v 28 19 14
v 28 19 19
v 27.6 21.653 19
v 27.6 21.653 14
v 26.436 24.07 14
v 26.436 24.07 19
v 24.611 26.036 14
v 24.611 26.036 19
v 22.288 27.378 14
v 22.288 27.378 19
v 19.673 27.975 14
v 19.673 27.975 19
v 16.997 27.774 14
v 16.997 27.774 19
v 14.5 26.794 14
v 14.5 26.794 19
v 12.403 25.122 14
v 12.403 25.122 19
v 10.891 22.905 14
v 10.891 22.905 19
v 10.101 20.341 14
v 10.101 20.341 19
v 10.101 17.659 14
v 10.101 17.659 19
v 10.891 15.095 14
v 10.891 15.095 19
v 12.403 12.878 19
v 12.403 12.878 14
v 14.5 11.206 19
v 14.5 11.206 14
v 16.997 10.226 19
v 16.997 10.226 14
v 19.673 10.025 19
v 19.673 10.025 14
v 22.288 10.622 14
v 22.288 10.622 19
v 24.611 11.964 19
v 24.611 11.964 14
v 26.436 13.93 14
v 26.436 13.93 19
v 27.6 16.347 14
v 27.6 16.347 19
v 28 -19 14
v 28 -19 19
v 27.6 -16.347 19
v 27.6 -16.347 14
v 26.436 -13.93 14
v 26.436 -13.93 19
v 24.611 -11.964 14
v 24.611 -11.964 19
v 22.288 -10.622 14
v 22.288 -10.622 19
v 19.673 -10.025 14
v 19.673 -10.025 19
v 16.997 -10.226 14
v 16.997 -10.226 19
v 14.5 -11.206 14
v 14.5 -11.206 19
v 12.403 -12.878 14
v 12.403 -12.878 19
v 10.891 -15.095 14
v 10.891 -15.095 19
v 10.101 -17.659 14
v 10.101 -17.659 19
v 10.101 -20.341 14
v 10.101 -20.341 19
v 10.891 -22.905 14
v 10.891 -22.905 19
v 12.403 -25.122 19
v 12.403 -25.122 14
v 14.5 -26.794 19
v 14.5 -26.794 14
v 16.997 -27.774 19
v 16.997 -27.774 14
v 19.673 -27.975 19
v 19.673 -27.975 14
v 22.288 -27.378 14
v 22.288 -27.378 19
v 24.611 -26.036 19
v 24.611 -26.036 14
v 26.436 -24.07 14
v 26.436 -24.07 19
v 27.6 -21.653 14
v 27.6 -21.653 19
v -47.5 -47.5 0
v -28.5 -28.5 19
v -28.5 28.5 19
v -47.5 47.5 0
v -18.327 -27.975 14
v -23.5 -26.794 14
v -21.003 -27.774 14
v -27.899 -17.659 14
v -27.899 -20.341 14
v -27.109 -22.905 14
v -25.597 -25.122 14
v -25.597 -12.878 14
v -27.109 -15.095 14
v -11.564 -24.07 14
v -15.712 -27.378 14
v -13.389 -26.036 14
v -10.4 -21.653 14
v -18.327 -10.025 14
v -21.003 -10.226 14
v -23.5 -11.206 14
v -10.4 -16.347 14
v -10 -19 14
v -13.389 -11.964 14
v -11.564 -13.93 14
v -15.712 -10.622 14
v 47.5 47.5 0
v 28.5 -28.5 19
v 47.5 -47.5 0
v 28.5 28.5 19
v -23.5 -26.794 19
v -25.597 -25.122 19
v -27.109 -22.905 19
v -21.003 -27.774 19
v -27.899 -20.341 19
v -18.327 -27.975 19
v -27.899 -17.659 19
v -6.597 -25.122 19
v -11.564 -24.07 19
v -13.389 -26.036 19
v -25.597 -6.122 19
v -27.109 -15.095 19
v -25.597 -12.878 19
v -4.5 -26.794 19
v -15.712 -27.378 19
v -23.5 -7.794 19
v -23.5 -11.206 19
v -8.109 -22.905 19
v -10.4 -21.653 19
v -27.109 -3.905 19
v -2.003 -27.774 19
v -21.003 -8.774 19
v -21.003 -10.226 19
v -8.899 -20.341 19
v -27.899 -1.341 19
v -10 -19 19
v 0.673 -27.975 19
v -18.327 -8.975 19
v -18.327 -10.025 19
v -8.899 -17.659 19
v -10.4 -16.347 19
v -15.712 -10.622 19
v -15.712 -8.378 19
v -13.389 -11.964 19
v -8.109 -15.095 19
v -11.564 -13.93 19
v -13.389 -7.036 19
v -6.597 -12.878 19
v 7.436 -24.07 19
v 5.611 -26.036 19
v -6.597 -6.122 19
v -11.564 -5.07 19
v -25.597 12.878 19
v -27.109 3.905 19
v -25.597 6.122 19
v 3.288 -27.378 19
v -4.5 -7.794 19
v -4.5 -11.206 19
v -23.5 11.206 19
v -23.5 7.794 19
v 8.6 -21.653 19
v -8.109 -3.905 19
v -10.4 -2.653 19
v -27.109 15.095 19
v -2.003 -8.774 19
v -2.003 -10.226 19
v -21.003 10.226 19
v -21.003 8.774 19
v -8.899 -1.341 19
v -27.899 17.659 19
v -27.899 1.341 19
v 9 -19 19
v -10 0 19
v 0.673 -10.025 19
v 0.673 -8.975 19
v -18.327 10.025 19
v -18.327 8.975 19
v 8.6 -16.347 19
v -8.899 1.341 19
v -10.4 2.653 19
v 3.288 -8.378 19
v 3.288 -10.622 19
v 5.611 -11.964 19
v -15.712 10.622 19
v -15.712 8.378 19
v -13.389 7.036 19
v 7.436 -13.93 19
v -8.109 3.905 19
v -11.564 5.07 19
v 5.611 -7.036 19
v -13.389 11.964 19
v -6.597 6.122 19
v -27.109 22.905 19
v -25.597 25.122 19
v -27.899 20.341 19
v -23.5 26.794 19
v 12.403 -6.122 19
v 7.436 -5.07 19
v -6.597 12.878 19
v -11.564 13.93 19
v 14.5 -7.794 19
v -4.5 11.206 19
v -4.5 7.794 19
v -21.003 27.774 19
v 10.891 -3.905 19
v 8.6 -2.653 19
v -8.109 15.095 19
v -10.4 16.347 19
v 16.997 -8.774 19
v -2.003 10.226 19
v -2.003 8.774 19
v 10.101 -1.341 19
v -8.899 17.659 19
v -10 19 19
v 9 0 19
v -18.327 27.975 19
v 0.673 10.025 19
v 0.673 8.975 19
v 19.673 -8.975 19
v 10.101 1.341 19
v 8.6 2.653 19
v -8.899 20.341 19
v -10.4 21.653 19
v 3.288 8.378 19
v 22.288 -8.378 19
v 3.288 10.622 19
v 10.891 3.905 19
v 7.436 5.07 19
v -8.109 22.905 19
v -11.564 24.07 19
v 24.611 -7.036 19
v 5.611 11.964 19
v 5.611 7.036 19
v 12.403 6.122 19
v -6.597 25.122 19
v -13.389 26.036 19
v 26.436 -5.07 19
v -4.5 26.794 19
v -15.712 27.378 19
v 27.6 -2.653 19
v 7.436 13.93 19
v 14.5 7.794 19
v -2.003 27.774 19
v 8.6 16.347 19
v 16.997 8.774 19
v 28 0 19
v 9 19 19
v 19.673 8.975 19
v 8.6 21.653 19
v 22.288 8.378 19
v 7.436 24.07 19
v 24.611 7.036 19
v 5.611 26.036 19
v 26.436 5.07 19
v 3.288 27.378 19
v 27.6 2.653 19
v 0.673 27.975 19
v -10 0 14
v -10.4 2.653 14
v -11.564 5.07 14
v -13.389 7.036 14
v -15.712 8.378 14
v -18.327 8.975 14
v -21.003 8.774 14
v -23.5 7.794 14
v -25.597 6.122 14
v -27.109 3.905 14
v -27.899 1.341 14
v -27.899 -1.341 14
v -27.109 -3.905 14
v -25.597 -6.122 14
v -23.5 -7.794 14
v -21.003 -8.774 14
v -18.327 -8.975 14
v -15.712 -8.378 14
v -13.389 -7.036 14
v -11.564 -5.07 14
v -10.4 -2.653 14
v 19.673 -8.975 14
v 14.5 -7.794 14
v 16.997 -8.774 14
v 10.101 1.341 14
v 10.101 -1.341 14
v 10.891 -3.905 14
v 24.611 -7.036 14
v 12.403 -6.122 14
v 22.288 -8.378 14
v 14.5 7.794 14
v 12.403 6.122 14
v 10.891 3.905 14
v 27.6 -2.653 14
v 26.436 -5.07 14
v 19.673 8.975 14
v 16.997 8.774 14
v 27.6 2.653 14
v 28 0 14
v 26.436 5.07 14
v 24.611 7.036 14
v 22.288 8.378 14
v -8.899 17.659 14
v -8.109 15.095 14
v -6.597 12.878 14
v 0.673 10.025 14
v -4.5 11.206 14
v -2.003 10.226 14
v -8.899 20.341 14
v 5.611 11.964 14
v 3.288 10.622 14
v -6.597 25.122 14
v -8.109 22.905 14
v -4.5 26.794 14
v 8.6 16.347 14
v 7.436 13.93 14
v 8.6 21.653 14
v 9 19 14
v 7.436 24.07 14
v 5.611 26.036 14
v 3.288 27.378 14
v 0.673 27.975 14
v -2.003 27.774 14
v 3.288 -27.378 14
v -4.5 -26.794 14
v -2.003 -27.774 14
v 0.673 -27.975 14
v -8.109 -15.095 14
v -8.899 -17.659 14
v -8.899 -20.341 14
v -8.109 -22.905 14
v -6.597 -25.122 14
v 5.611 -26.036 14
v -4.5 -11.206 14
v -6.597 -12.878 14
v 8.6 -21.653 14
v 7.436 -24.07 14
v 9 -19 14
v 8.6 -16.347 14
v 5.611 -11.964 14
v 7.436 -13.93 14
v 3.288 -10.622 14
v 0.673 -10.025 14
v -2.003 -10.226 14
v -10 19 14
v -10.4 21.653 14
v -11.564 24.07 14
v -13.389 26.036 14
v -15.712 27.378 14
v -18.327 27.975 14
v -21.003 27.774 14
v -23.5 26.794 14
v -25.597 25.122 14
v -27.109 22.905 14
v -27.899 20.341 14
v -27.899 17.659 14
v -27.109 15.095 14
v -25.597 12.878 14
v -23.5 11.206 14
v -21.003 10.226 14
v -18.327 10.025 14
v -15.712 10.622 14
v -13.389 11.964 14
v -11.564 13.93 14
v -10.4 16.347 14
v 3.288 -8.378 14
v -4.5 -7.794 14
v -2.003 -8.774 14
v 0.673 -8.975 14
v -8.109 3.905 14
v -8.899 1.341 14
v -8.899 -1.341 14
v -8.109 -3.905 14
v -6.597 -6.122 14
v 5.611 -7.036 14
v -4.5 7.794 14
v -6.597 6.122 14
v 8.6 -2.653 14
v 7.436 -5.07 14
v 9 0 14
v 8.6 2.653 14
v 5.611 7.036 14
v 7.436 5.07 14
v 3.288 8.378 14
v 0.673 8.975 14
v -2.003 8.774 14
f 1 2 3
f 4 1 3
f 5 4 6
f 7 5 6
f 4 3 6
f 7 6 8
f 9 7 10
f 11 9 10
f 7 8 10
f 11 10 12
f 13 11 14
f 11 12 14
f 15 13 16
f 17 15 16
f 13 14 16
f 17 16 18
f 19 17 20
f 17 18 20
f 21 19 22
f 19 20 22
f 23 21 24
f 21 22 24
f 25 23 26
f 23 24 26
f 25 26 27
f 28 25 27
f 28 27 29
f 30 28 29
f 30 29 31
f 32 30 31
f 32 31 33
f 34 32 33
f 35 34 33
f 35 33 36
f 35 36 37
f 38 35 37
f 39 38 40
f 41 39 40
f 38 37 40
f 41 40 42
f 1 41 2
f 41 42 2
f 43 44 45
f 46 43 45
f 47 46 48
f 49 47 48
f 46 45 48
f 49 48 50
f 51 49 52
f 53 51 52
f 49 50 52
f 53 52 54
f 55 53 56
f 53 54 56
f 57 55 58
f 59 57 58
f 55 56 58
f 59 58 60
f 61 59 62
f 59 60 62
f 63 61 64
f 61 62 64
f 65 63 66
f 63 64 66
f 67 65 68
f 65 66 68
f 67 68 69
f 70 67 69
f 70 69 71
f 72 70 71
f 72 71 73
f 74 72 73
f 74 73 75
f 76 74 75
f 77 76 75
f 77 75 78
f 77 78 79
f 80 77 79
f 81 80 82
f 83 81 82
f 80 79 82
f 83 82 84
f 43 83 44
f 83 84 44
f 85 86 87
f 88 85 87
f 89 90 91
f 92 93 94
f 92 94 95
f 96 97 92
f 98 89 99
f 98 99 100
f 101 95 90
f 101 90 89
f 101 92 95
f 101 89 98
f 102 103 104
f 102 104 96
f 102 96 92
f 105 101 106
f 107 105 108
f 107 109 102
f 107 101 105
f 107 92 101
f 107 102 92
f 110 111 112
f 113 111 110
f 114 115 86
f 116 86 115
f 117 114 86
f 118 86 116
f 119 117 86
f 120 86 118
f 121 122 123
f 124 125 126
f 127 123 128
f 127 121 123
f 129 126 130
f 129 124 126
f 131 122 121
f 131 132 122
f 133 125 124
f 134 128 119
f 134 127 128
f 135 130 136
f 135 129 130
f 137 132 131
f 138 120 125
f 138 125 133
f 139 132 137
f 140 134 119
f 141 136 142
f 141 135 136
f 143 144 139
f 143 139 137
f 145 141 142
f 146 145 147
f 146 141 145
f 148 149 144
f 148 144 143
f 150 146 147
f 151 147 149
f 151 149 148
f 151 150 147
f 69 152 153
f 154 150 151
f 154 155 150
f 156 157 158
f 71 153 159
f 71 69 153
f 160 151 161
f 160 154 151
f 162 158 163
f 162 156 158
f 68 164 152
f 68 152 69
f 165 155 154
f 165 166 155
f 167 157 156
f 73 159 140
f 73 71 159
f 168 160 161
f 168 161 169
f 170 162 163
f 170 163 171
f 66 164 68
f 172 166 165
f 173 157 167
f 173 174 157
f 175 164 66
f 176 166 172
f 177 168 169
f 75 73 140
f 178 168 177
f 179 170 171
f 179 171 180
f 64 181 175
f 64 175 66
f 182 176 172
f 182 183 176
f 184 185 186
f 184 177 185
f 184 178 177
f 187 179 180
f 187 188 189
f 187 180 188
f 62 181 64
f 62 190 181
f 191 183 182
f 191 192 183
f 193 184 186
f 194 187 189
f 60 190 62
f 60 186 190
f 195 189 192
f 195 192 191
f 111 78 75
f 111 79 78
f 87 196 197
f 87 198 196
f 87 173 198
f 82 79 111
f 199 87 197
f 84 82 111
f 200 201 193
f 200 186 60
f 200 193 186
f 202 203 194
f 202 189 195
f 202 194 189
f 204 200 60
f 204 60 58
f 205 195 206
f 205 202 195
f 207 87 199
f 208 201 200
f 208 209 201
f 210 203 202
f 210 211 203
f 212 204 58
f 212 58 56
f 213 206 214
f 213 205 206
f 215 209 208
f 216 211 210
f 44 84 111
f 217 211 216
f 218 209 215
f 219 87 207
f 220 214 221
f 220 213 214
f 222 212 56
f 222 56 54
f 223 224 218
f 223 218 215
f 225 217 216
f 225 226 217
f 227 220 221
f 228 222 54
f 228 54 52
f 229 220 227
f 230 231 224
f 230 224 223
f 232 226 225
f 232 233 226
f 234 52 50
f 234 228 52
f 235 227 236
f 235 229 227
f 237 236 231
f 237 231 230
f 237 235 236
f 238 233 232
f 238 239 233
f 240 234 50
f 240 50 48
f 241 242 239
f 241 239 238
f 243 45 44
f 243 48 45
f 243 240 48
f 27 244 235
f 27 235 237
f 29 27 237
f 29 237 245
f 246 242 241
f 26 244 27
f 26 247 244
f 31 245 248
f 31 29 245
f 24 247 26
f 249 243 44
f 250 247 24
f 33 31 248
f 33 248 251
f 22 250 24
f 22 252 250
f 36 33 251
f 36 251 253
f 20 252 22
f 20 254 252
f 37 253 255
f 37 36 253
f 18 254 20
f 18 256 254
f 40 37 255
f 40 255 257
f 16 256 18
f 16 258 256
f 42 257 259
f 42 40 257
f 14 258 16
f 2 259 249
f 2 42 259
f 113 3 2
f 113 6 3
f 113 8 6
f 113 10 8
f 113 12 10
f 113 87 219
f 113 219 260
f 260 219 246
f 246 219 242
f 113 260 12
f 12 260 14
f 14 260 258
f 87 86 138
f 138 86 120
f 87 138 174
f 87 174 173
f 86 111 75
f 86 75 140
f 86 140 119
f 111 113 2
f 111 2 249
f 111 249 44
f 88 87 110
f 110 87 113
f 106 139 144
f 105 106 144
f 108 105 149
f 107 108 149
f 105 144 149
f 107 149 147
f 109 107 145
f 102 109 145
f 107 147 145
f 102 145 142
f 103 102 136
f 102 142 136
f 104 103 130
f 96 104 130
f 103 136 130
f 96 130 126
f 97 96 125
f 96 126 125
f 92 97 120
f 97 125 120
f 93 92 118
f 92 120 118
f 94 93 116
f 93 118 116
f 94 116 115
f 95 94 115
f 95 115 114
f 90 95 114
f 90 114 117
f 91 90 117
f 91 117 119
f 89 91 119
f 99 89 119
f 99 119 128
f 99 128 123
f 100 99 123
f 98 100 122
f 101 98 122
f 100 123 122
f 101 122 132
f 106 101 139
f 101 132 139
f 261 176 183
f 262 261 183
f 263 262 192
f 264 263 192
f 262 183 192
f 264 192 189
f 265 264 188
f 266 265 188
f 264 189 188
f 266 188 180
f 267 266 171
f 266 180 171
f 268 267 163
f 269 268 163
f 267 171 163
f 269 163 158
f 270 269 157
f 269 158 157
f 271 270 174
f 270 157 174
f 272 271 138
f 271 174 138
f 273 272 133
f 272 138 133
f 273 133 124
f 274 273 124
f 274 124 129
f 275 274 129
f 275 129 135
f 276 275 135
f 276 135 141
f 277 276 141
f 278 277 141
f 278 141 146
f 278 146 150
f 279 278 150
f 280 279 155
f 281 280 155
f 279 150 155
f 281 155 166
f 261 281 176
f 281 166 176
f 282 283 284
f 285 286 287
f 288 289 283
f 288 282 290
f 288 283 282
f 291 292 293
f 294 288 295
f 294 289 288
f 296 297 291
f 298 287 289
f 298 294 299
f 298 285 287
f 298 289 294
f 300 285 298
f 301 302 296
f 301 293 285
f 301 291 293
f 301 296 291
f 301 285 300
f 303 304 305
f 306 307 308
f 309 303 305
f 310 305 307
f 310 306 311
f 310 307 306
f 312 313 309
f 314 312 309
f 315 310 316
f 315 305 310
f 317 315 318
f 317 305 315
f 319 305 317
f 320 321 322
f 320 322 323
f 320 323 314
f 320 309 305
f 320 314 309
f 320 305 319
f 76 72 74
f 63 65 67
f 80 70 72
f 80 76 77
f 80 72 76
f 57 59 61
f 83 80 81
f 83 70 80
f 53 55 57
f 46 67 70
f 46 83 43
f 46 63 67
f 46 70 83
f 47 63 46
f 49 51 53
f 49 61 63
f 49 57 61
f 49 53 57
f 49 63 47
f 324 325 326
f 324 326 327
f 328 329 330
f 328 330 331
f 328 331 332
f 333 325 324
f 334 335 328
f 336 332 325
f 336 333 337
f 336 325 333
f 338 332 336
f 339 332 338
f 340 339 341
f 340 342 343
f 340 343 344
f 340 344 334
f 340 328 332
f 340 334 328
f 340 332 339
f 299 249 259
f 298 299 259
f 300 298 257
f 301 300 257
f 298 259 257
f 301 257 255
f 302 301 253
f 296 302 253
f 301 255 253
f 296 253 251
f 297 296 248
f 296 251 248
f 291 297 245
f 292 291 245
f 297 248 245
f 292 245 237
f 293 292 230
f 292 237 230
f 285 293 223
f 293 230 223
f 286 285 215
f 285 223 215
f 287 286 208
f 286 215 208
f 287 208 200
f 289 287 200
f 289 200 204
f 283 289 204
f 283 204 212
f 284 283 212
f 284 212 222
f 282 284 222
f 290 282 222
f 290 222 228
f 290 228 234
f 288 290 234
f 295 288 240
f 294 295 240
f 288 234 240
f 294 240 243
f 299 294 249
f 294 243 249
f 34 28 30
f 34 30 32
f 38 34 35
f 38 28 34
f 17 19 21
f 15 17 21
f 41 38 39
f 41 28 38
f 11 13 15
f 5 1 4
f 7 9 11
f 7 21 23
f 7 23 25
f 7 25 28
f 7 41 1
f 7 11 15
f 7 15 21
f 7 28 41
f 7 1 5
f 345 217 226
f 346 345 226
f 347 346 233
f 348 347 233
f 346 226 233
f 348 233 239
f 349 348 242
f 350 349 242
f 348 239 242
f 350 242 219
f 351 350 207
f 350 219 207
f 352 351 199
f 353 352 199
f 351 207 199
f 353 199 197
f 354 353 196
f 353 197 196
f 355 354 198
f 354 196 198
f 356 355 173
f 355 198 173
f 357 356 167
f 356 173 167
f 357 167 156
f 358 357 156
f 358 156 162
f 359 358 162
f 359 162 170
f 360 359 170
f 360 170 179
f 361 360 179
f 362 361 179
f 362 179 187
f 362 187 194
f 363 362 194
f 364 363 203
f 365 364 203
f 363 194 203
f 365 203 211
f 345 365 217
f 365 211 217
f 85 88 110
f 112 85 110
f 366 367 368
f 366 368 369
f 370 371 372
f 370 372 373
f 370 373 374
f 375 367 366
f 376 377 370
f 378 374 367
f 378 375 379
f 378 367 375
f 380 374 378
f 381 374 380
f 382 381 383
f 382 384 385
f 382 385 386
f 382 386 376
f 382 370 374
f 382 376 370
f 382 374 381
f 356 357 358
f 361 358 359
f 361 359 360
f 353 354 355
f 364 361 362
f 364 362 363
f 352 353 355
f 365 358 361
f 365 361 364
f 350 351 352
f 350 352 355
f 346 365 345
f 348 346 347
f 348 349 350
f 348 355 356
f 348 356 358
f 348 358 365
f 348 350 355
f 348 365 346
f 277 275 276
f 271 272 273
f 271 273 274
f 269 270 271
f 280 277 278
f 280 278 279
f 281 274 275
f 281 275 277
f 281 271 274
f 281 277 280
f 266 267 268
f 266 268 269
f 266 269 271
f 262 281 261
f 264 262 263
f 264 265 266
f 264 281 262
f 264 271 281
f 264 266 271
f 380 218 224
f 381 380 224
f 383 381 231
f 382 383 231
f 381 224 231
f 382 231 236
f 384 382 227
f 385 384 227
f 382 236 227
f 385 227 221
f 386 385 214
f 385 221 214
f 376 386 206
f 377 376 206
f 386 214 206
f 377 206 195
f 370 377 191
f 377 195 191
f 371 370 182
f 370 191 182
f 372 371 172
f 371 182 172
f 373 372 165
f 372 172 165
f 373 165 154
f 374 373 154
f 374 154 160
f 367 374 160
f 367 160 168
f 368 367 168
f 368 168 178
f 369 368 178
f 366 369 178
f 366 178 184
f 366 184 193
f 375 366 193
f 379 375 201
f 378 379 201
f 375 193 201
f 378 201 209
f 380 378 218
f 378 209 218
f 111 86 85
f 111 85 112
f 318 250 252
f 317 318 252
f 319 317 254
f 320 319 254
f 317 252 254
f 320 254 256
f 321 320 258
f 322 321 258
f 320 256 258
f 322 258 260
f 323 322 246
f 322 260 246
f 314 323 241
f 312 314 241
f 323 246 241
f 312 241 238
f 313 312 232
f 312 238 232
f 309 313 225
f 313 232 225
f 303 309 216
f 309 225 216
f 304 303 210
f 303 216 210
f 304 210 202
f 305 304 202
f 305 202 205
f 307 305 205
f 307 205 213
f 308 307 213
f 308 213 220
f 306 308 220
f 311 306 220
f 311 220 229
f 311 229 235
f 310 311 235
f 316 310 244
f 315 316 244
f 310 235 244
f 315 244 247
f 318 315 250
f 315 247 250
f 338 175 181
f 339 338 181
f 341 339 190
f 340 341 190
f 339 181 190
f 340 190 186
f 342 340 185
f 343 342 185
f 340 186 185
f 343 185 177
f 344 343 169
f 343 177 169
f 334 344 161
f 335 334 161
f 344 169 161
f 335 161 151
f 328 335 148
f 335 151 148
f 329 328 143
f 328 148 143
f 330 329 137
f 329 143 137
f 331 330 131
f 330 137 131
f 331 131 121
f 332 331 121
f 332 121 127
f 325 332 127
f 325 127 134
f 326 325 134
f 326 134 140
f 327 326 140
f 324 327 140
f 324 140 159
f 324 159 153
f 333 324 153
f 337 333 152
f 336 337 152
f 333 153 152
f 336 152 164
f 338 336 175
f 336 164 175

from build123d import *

# Parameters (mm, degrees)
SKETCH_1_W          = 95
SKETCH_1_H          = 95
EXTRUDE_1_DEPTH     = 19
CHAMFER_1_SIZE      = 19
SKETCH_2_R          = 9
CUT_EXTRUDE_1_DEPTH = 5


with BuildPart() as part:
    # Эскиз1 → Бобышка-Вытянуть1 (new body)
    with BuildSketch(Plane.XY):
        Rectangle(SKETCH_1_W, SKETCH_1_H)
    extrude(amount=EXTRUDE_1_DEPTH)

    # Фаска1
    chamfer_1_edges = [part.edges().sort_by_distance(p)[0] for p in [
        (0, 47.5, 19),
        (47.5, 0, 19),
        (0, -47.5, 19),
        (-47.5, 0, 19),
    ]]
    chamfer(chamfer_1_edges, length=CHAMFER_1_SIZE - 0.0001)  # a hair under: the kernel refuses the full size

    # Эскиз2 → Вырез-Вытянуть1 (cut)
    with BuildSketch(Plane.XY.offset(19)):
        Circle(SKETCH_2_R)
        with Locations((19, 0)):
            Circle(SKETCH_2_R)
        with Locations((19, 19)):
            Circle(SKETCH_2_R)
        with Locations((0, 19)):
            Circle(SKETCH_2_R)
        with Locations((-19, 19)):
            Circle(SKETCH_2_R)
        with Locations((-19, 0)):
            Circle(SKETCH_2_R)
        with Locations((-19, -19)):
            Circle(SKETCH_2_R)
        with Locations((0, -19)):
            Circle(SKETCH_2_R)
        with Locations((19, -19)):
            Circle(SKETCH_2_R)
    extrude(amount=-CUT_EXTRUDE_1_DEPTH, mode=Mode.SUBTRACT)


solid = part.part
